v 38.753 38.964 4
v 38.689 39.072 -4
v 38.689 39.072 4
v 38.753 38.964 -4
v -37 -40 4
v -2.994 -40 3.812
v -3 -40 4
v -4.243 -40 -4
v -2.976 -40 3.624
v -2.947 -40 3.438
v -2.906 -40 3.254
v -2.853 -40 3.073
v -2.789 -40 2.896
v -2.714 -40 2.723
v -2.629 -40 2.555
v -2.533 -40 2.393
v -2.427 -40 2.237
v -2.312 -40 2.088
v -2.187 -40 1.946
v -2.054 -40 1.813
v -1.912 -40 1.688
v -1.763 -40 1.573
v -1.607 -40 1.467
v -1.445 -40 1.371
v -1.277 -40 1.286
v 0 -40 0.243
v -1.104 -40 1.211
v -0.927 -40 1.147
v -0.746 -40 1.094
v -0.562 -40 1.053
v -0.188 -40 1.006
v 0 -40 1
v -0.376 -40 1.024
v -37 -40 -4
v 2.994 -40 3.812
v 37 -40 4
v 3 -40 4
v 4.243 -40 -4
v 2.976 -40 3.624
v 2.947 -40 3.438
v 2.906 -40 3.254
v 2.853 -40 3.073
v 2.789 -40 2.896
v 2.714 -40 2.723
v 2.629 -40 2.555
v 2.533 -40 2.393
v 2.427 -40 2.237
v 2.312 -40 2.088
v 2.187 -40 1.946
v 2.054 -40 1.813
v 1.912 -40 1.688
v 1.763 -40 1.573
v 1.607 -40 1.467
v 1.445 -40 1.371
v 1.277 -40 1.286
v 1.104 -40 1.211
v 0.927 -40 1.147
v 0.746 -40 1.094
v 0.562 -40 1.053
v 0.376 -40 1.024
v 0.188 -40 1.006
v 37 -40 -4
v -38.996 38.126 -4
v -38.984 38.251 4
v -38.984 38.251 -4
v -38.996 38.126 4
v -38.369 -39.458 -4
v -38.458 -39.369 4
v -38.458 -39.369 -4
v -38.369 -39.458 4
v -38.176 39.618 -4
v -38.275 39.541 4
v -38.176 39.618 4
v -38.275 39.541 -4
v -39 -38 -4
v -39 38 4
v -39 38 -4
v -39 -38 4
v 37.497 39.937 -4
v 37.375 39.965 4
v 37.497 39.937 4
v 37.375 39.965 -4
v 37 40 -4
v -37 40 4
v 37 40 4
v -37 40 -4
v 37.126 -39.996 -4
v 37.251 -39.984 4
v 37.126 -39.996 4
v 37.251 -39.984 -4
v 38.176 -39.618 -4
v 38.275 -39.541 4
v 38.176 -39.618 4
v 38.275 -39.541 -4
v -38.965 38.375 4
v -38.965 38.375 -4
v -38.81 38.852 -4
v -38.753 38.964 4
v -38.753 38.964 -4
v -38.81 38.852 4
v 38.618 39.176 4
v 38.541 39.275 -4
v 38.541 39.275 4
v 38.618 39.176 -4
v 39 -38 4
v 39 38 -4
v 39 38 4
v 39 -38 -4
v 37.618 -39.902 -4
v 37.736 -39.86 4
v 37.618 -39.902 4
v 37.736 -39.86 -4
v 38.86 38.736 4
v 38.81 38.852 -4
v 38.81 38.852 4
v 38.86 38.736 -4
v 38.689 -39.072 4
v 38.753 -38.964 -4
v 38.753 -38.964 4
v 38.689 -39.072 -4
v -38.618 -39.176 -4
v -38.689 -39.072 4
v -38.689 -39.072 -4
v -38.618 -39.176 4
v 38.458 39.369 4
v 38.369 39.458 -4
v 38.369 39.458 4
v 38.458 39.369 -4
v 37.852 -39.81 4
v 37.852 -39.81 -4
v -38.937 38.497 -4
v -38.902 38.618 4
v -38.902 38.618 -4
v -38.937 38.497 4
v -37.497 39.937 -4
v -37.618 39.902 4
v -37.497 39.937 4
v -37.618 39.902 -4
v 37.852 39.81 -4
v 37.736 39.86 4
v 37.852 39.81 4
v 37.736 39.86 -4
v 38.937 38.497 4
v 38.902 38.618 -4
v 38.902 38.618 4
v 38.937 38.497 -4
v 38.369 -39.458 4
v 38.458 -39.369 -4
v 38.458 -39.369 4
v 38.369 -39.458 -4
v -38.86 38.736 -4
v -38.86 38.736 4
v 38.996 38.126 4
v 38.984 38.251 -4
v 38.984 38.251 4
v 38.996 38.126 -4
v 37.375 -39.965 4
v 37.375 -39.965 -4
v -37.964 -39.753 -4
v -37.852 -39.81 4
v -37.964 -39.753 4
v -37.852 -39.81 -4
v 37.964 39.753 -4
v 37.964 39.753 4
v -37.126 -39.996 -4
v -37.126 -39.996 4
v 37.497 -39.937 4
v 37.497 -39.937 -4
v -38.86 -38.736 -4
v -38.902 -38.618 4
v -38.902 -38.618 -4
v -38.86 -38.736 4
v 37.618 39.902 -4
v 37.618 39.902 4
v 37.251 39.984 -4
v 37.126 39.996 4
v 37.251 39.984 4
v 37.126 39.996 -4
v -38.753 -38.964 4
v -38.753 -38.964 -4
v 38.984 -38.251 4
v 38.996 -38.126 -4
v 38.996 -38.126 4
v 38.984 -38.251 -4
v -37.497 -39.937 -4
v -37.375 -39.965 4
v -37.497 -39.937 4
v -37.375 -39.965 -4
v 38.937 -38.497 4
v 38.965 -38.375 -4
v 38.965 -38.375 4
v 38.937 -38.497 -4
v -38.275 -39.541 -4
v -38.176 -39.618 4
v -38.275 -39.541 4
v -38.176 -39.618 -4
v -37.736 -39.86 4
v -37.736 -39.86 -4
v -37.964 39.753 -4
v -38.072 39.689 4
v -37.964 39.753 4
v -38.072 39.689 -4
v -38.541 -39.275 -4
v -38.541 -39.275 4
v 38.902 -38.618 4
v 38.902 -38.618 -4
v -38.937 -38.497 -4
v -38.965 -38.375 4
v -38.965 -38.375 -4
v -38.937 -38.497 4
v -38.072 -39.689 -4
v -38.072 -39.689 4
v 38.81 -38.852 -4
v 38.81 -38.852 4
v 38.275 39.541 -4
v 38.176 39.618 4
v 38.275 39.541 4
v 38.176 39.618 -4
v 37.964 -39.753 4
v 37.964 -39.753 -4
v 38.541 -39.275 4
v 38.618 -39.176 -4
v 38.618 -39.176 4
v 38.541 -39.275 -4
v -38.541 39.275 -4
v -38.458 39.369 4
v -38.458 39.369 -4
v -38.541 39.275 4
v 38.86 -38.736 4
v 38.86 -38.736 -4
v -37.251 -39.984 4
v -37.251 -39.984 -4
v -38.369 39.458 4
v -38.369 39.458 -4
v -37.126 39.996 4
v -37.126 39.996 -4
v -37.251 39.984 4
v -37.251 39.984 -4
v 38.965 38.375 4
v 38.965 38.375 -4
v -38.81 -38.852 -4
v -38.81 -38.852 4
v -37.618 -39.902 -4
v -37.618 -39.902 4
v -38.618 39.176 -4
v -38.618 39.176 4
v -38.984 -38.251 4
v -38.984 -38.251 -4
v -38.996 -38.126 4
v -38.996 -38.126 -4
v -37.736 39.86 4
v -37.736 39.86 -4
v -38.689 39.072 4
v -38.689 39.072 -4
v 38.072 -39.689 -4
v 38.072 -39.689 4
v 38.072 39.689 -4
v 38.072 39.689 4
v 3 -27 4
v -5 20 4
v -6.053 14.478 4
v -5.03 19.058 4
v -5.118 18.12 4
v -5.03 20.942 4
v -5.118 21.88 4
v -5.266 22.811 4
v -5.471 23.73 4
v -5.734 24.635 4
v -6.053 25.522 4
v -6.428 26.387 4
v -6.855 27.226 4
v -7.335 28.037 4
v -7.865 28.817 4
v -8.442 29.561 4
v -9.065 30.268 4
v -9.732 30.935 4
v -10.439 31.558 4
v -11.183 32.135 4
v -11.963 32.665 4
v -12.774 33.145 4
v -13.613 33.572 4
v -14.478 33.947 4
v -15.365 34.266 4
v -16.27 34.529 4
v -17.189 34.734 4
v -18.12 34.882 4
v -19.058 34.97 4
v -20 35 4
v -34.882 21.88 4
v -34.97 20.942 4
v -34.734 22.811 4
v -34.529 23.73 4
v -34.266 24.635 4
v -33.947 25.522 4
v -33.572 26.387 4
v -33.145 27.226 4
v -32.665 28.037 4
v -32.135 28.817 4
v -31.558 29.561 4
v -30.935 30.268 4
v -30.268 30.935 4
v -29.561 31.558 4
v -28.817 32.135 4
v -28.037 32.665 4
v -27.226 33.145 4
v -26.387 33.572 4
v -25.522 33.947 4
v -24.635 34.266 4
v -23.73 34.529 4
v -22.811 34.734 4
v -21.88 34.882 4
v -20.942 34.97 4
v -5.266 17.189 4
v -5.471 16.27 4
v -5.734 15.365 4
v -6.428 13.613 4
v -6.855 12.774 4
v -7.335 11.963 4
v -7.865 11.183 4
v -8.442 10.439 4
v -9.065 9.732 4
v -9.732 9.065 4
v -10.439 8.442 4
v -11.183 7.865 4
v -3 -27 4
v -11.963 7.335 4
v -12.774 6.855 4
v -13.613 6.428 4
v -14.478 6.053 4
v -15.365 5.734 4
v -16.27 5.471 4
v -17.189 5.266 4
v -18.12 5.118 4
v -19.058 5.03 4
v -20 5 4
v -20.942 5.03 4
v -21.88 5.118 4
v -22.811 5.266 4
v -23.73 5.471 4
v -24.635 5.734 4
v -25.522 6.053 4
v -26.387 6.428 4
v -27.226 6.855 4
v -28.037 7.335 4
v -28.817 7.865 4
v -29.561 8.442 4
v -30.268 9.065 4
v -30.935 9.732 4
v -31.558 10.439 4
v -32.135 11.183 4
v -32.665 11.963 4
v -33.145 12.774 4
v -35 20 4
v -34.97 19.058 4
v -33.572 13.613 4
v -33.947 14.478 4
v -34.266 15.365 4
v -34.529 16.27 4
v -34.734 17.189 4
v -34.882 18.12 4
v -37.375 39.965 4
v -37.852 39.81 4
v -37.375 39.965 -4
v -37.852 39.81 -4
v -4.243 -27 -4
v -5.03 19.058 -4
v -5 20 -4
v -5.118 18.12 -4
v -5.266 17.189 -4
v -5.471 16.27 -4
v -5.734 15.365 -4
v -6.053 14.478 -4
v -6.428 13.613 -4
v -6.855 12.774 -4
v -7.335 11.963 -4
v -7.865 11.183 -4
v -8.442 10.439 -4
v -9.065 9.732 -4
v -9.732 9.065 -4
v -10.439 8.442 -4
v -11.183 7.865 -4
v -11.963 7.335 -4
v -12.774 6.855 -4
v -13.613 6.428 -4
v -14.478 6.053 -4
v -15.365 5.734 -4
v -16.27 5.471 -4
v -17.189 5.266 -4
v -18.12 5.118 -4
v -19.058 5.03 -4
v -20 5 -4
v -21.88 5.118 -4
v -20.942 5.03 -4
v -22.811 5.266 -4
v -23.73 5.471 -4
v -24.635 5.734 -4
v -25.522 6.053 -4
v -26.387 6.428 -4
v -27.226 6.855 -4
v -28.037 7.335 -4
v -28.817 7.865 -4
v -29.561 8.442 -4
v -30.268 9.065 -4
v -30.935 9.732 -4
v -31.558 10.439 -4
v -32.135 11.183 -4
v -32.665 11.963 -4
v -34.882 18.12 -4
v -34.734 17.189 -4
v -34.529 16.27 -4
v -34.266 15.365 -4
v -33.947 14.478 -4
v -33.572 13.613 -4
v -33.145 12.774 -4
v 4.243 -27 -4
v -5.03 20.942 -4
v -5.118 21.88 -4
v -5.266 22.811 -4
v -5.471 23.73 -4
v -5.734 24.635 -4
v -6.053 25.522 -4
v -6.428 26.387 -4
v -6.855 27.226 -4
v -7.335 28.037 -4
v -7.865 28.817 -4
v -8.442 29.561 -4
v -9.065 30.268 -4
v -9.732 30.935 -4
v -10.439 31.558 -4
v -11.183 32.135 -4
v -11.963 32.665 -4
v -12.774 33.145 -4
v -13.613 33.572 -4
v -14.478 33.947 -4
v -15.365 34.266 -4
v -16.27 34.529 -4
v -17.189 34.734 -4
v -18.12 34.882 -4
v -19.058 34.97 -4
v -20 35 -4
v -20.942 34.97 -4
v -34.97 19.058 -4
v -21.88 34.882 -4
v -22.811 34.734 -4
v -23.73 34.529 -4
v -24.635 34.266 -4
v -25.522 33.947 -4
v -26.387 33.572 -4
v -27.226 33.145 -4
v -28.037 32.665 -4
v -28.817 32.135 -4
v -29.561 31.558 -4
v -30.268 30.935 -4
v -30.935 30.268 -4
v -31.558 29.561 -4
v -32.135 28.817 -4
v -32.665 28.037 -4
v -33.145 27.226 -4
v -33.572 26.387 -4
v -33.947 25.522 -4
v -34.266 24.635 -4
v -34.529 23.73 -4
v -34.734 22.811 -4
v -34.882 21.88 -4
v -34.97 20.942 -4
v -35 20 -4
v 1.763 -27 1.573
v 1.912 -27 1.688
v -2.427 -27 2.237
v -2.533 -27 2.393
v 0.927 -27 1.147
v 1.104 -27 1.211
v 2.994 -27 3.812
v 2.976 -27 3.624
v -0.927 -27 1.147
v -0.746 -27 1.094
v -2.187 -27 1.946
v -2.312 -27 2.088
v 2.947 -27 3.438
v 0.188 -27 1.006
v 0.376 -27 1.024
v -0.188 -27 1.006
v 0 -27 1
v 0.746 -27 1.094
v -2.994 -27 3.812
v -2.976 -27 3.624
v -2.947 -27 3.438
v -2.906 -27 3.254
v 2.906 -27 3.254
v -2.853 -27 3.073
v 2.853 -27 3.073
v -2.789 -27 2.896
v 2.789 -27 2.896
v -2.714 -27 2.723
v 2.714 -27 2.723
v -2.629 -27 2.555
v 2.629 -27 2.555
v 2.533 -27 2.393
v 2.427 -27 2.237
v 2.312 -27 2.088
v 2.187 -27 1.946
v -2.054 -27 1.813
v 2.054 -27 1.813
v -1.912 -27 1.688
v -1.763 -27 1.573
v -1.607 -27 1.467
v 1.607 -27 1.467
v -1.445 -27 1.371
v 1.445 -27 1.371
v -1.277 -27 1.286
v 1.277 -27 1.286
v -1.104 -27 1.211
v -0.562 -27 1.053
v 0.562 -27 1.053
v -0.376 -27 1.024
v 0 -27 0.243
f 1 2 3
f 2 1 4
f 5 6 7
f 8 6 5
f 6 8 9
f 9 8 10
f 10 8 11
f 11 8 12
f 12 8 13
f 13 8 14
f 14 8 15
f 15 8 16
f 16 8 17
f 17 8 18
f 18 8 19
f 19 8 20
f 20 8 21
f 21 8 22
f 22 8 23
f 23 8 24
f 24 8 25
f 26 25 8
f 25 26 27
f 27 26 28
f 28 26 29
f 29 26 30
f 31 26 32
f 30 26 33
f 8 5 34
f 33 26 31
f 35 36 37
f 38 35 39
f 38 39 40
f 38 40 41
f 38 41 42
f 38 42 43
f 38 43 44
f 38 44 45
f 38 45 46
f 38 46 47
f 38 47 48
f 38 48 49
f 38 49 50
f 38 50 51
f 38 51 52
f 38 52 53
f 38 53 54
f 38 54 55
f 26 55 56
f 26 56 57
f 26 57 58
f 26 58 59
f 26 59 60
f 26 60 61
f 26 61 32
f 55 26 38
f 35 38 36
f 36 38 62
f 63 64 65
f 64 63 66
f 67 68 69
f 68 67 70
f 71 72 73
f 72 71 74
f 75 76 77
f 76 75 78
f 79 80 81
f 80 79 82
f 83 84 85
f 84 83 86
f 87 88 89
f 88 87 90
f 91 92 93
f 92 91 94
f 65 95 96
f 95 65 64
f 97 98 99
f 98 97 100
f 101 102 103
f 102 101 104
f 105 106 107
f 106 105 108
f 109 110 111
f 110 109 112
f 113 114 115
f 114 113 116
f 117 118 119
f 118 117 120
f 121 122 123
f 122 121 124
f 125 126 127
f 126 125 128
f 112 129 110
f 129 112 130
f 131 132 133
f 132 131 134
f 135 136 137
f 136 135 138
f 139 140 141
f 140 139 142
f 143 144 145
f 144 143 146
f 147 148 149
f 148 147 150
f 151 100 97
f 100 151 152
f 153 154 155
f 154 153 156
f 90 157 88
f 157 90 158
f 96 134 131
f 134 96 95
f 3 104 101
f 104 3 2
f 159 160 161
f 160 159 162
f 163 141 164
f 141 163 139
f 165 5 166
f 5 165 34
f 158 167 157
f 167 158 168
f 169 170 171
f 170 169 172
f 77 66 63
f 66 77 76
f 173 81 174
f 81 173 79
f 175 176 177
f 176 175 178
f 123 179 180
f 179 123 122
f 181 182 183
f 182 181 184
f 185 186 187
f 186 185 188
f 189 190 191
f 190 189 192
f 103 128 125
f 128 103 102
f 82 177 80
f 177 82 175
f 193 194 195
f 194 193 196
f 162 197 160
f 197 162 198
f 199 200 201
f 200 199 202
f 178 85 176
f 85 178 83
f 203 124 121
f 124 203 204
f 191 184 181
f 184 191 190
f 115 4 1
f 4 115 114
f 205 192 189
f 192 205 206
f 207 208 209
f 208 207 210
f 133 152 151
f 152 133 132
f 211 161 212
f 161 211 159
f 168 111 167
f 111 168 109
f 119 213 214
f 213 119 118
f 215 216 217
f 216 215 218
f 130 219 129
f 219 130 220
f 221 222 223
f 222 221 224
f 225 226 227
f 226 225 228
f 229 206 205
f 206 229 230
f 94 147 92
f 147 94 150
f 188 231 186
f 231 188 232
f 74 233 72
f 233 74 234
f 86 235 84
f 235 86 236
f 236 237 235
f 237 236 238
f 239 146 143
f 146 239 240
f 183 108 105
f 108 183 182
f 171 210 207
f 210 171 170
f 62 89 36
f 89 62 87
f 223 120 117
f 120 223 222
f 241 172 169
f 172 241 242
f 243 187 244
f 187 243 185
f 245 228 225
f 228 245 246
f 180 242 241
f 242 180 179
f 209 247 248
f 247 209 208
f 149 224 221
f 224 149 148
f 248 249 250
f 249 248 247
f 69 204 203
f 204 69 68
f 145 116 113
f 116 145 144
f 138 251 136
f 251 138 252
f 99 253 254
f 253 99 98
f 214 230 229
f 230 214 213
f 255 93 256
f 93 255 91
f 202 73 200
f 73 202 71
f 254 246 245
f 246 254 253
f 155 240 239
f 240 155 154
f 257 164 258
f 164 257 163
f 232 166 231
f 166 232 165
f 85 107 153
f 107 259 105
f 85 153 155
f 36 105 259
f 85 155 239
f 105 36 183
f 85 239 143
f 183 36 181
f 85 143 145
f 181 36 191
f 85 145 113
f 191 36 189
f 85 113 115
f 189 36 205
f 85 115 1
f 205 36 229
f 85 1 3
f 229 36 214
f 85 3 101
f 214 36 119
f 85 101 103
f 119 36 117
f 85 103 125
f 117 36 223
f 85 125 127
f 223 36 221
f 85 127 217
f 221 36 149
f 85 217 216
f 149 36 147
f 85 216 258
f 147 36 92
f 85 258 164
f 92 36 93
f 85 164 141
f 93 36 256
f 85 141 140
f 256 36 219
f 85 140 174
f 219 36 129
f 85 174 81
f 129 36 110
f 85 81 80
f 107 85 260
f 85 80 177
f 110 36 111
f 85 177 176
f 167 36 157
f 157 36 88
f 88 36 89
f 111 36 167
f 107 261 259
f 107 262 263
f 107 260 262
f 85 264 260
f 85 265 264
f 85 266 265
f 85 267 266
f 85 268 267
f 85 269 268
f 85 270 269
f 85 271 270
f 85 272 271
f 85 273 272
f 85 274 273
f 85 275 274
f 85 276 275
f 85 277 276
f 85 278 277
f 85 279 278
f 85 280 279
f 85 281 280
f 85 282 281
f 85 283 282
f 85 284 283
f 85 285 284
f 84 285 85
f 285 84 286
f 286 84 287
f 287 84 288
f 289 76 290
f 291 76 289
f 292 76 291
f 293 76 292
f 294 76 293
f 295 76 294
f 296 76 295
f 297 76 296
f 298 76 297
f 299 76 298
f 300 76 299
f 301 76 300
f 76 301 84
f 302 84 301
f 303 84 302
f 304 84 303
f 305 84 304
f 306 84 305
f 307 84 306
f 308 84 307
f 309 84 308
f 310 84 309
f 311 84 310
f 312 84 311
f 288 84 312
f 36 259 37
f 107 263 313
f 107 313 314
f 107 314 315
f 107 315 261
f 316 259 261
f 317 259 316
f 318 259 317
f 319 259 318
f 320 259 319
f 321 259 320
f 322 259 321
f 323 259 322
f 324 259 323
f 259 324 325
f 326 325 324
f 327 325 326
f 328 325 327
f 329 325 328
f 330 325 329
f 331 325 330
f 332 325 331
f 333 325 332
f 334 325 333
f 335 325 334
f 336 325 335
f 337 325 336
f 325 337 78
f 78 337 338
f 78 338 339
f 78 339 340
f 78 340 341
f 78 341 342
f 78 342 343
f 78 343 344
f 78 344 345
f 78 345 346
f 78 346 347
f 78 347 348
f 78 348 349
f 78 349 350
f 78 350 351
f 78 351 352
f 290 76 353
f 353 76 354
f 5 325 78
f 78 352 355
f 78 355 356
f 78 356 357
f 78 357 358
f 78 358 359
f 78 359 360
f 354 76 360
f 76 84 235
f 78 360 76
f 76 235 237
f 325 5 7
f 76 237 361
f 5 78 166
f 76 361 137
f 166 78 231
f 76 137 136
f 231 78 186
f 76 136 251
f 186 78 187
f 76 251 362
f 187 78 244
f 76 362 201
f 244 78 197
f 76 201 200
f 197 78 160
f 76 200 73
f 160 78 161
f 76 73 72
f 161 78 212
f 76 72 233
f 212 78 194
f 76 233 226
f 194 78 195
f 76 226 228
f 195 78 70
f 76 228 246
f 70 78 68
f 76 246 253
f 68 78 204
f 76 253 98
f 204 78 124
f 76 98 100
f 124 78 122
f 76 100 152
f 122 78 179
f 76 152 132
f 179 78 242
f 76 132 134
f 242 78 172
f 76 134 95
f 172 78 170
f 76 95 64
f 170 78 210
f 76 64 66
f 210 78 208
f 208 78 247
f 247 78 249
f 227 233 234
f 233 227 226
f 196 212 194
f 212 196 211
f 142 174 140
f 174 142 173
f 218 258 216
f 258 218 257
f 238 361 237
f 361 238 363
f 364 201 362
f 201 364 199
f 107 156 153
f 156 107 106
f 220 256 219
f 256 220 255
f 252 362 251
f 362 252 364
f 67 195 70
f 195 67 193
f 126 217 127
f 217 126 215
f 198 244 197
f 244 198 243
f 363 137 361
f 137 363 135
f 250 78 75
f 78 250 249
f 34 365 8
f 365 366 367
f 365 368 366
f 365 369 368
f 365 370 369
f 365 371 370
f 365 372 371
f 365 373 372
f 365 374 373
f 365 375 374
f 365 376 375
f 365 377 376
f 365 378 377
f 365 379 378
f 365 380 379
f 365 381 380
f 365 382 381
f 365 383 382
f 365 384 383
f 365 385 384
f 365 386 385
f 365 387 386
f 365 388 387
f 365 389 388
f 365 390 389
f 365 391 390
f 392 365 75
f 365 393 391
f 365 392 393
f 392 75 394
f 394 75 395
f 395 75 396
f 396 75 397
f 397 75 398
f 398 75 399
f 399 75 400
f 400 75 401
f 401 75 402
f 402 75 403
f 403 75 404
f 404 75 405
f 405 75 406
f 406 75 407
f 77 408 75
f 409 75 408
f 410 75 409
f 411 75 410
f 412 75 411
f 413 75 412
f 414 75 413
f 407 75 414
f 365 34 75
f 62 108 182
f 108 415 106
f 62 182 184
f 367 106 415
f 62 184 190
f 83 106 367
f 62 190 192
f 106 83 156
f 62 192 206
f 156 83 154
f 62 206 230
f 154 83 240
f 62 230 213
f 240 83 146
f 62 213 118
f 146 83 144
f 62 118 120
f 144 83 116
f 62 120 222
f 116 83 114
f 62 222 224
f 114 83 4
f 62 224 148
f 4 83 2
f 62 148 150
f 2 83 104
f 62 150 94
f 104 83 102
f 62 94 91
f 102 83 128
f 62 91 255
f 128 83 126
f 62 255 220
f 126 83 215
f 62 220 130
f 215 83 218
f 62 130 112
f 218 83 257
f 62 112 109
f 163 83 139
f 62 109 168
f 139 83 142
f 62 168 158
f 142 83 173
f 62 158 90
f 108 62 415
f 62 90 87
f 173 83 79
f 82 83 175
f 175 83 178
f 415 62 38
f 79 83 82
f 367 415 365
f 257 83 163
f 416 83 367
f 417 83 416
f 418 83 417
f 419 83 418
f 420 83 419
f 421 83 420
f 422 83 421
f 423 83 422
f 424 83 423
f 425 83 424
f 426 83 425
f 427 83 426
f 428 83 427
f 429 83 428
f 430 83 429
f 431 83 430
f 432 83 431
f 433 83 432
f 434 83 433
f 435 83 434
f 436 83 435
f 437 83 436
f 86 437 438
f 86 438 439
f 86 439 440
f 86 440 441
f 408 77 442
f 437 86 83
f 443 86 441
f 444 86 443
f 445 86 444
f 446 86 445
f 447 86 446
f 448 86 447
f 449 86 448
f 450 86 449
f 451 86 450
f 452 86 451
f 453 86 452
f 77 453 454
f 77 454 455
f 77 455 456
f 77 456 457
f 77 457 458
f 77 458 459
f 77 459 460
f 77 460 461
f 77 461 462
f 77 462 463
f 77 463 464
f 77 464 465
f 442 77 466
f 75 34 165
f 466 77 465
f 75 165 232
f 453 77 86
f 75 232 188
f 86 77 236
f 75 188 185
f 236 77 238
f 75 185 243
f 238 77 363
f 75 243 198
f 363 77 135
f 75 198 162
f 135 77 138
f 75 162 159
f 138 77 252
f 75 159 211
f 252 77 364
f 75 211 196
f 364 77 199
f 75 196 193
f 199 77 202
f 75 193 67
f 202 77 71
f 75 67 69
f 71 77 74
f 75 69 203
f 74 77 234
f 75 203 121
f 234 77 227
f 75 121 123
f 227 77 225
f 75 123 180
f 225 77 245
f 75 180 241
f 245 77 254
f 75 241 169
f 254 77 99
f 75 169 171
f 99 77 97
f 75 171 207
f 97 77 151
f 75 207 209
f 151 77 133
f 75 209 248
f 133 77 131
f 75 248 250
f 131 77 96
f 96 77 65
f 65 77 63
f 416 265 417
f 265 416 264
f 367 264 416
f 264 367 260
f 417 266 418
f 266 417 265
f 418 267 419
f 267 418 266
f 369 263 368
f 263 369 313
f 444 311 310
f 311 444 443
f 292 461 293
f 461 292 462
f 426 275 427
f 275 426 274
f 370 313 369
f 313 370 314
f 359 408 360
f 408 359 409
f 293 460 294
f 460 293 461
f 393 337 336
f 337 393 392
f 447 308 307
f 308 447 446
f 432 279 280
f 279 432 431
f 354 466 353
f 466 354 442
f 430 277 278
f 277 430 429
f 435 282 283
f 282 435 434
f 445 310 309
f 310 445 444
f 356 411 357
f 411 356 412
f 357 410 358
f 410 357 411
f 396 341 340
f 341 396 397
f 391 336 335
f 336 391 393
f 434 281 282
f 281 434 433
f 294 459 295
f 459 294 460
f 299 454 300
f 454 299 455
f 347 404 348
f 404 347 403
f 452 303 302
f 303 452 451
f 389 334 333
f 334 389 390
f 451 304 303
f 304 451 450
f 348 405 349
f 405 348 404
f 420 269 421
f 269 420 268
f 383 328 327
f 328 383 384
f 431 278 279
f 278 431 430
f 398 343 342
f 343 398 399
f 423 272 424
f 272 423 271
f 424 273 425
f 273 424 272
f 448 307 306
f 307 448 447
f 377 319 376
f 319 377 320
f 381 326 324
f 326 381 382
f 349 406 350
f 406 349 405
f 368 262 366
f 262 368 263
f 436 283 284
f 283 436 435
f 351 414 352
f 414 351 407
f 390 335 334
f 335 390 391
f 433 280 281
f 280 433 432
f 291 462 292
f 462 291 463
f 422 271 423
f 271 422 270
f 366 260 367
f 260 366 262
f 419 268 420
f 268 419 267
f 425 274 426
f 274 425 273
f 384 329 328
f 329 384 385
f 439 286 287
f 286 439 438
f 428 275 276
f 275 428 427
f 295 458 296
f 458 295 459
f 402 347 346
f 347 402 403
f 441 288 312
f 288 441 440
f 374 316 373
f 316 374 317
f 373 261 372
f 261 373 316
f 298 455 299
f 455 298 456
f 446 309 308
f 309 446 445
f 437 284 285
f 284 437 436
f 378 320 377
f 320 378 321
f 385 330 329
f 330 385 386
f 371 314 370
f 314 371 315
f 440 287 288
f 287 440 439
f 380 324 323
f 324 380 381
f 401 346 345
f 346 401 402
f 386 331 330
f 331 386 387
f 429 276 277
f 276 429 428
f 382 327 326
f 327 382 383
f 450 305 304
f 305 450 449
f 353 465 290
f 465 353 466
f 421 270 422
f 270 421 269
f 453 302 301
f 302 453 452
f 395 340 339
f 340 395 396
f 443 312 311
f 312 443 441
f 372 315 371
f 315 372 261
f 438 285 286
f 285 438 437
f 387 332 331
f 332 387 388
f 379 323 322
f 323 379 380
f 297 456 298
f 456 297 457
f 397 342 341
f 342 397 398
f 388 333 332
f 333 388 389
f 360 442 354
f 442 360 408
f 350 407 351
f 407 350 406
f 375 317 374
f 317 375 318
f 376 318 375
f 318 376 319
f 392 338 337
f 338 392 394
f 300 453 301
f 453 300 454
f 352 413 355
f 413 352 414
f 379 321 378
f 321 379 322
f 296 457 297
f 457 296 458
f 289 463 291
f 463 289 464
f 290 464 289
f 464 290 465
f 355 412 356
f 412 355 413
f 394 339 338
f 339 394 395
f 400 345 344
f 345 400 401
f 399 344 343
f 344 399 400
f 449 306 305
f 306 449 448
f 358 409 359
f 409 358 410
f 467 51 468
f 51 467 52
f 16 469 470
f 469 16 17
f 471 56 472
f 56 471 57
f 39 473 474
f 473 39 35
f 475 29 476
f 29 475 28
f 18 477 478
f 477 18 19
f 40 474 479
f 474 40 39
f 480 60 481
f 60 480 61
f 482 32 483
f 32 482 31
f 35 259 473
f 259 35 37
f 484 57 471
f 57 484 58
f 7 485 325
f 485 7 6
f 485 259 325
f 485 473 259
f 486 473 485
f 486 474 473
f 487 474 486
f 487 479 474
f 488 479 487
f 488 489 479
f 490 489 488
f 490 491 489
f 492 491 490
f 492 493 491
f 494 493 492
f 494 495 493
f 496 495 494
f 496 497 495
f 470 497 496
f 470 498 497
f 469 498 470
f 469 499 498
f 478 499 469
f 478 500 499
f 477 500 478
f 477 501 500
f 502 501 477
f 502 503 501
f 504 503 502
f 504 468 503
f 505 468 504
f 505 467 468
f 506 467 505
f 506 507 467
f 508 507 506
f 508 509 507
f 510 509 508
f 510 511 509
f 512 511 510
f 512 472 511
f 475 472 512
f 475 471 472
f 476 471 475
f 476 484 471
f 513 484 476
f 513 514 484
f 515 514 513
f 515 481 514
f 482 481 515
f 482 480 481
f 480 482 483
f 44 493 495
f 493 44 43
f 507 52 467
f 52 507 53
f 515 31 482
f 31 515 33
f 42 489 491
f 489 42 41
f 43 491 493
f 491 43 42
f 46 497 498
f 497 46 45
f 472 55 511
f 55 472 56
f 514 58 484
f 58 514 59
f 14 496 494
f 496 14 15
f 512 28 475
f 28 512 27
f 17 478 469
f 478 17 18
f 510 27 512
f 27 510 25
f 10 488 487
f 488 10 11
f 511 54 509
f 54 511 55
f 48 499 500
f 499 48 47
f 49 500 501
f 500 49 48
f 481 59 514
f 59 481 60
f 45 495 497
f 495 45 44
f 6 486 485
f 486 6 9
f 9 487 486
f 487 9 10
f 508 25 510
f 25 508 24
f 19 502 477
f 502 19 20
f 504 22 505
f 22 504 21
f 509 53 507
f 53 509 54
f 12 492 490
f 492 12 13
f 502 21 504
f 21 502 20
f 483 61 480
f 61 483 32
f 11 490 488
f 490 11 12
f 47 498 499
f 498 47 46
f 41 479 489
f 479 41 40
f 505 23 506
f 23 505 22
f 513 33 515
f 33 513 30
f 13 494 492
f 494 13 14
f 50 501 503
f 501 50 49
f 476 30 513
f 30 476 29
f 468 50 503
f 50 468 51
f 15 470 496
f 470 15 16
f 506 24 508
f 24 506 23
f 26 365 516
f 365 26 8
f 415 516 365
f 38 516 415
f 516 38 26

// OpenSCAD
// simple spacer

$fn = 100;
FUDGE = 0.001;

cd = 4.0;
ph = 8.0;
px = 78.0;
py = 80.0;
phd = 30.0;
rl = 13.0;
rr = 3.0;

difference() {
  // plate
  hull() {
    translate([-(px-cd)/2, -(py-cd)/2, 0])
      cylinder(h=ph, d=cd, center=true);
    translate([(px-cd)/2, -(py-cd)/2, 0])
      cylinder(h=ph, d=cd, center=true);
    translate([(px-cd)/2, (py-cd)/2, 0])
      cylinder(h=ph, d=cd, center=true);
    translate([-(px-cd)/2, (py-cd)/2, 0])
      cylinder(h=ph, d=cd, center=true);
  }
  // wiring hole to next box
  translate([-phd/1.5, phd/1.5, 0])
    cylinder(h=ph+FUDGE, d=phd, center=true);
  // indent for gang box ridge
  translate([0,-(py-rl)/2,ph/2])
    rotate([90,0,0])
      cylinder(h=rl+FUDGE, r=rr, center=true);
  // another, but a tent shape so we don't need overhangs
  translate([0,-(py-rl)/2,-ph/2])
    rotate([90,45,0])
      cube([rr*2,rr*2,rl+FUDGE], center=true);
}
